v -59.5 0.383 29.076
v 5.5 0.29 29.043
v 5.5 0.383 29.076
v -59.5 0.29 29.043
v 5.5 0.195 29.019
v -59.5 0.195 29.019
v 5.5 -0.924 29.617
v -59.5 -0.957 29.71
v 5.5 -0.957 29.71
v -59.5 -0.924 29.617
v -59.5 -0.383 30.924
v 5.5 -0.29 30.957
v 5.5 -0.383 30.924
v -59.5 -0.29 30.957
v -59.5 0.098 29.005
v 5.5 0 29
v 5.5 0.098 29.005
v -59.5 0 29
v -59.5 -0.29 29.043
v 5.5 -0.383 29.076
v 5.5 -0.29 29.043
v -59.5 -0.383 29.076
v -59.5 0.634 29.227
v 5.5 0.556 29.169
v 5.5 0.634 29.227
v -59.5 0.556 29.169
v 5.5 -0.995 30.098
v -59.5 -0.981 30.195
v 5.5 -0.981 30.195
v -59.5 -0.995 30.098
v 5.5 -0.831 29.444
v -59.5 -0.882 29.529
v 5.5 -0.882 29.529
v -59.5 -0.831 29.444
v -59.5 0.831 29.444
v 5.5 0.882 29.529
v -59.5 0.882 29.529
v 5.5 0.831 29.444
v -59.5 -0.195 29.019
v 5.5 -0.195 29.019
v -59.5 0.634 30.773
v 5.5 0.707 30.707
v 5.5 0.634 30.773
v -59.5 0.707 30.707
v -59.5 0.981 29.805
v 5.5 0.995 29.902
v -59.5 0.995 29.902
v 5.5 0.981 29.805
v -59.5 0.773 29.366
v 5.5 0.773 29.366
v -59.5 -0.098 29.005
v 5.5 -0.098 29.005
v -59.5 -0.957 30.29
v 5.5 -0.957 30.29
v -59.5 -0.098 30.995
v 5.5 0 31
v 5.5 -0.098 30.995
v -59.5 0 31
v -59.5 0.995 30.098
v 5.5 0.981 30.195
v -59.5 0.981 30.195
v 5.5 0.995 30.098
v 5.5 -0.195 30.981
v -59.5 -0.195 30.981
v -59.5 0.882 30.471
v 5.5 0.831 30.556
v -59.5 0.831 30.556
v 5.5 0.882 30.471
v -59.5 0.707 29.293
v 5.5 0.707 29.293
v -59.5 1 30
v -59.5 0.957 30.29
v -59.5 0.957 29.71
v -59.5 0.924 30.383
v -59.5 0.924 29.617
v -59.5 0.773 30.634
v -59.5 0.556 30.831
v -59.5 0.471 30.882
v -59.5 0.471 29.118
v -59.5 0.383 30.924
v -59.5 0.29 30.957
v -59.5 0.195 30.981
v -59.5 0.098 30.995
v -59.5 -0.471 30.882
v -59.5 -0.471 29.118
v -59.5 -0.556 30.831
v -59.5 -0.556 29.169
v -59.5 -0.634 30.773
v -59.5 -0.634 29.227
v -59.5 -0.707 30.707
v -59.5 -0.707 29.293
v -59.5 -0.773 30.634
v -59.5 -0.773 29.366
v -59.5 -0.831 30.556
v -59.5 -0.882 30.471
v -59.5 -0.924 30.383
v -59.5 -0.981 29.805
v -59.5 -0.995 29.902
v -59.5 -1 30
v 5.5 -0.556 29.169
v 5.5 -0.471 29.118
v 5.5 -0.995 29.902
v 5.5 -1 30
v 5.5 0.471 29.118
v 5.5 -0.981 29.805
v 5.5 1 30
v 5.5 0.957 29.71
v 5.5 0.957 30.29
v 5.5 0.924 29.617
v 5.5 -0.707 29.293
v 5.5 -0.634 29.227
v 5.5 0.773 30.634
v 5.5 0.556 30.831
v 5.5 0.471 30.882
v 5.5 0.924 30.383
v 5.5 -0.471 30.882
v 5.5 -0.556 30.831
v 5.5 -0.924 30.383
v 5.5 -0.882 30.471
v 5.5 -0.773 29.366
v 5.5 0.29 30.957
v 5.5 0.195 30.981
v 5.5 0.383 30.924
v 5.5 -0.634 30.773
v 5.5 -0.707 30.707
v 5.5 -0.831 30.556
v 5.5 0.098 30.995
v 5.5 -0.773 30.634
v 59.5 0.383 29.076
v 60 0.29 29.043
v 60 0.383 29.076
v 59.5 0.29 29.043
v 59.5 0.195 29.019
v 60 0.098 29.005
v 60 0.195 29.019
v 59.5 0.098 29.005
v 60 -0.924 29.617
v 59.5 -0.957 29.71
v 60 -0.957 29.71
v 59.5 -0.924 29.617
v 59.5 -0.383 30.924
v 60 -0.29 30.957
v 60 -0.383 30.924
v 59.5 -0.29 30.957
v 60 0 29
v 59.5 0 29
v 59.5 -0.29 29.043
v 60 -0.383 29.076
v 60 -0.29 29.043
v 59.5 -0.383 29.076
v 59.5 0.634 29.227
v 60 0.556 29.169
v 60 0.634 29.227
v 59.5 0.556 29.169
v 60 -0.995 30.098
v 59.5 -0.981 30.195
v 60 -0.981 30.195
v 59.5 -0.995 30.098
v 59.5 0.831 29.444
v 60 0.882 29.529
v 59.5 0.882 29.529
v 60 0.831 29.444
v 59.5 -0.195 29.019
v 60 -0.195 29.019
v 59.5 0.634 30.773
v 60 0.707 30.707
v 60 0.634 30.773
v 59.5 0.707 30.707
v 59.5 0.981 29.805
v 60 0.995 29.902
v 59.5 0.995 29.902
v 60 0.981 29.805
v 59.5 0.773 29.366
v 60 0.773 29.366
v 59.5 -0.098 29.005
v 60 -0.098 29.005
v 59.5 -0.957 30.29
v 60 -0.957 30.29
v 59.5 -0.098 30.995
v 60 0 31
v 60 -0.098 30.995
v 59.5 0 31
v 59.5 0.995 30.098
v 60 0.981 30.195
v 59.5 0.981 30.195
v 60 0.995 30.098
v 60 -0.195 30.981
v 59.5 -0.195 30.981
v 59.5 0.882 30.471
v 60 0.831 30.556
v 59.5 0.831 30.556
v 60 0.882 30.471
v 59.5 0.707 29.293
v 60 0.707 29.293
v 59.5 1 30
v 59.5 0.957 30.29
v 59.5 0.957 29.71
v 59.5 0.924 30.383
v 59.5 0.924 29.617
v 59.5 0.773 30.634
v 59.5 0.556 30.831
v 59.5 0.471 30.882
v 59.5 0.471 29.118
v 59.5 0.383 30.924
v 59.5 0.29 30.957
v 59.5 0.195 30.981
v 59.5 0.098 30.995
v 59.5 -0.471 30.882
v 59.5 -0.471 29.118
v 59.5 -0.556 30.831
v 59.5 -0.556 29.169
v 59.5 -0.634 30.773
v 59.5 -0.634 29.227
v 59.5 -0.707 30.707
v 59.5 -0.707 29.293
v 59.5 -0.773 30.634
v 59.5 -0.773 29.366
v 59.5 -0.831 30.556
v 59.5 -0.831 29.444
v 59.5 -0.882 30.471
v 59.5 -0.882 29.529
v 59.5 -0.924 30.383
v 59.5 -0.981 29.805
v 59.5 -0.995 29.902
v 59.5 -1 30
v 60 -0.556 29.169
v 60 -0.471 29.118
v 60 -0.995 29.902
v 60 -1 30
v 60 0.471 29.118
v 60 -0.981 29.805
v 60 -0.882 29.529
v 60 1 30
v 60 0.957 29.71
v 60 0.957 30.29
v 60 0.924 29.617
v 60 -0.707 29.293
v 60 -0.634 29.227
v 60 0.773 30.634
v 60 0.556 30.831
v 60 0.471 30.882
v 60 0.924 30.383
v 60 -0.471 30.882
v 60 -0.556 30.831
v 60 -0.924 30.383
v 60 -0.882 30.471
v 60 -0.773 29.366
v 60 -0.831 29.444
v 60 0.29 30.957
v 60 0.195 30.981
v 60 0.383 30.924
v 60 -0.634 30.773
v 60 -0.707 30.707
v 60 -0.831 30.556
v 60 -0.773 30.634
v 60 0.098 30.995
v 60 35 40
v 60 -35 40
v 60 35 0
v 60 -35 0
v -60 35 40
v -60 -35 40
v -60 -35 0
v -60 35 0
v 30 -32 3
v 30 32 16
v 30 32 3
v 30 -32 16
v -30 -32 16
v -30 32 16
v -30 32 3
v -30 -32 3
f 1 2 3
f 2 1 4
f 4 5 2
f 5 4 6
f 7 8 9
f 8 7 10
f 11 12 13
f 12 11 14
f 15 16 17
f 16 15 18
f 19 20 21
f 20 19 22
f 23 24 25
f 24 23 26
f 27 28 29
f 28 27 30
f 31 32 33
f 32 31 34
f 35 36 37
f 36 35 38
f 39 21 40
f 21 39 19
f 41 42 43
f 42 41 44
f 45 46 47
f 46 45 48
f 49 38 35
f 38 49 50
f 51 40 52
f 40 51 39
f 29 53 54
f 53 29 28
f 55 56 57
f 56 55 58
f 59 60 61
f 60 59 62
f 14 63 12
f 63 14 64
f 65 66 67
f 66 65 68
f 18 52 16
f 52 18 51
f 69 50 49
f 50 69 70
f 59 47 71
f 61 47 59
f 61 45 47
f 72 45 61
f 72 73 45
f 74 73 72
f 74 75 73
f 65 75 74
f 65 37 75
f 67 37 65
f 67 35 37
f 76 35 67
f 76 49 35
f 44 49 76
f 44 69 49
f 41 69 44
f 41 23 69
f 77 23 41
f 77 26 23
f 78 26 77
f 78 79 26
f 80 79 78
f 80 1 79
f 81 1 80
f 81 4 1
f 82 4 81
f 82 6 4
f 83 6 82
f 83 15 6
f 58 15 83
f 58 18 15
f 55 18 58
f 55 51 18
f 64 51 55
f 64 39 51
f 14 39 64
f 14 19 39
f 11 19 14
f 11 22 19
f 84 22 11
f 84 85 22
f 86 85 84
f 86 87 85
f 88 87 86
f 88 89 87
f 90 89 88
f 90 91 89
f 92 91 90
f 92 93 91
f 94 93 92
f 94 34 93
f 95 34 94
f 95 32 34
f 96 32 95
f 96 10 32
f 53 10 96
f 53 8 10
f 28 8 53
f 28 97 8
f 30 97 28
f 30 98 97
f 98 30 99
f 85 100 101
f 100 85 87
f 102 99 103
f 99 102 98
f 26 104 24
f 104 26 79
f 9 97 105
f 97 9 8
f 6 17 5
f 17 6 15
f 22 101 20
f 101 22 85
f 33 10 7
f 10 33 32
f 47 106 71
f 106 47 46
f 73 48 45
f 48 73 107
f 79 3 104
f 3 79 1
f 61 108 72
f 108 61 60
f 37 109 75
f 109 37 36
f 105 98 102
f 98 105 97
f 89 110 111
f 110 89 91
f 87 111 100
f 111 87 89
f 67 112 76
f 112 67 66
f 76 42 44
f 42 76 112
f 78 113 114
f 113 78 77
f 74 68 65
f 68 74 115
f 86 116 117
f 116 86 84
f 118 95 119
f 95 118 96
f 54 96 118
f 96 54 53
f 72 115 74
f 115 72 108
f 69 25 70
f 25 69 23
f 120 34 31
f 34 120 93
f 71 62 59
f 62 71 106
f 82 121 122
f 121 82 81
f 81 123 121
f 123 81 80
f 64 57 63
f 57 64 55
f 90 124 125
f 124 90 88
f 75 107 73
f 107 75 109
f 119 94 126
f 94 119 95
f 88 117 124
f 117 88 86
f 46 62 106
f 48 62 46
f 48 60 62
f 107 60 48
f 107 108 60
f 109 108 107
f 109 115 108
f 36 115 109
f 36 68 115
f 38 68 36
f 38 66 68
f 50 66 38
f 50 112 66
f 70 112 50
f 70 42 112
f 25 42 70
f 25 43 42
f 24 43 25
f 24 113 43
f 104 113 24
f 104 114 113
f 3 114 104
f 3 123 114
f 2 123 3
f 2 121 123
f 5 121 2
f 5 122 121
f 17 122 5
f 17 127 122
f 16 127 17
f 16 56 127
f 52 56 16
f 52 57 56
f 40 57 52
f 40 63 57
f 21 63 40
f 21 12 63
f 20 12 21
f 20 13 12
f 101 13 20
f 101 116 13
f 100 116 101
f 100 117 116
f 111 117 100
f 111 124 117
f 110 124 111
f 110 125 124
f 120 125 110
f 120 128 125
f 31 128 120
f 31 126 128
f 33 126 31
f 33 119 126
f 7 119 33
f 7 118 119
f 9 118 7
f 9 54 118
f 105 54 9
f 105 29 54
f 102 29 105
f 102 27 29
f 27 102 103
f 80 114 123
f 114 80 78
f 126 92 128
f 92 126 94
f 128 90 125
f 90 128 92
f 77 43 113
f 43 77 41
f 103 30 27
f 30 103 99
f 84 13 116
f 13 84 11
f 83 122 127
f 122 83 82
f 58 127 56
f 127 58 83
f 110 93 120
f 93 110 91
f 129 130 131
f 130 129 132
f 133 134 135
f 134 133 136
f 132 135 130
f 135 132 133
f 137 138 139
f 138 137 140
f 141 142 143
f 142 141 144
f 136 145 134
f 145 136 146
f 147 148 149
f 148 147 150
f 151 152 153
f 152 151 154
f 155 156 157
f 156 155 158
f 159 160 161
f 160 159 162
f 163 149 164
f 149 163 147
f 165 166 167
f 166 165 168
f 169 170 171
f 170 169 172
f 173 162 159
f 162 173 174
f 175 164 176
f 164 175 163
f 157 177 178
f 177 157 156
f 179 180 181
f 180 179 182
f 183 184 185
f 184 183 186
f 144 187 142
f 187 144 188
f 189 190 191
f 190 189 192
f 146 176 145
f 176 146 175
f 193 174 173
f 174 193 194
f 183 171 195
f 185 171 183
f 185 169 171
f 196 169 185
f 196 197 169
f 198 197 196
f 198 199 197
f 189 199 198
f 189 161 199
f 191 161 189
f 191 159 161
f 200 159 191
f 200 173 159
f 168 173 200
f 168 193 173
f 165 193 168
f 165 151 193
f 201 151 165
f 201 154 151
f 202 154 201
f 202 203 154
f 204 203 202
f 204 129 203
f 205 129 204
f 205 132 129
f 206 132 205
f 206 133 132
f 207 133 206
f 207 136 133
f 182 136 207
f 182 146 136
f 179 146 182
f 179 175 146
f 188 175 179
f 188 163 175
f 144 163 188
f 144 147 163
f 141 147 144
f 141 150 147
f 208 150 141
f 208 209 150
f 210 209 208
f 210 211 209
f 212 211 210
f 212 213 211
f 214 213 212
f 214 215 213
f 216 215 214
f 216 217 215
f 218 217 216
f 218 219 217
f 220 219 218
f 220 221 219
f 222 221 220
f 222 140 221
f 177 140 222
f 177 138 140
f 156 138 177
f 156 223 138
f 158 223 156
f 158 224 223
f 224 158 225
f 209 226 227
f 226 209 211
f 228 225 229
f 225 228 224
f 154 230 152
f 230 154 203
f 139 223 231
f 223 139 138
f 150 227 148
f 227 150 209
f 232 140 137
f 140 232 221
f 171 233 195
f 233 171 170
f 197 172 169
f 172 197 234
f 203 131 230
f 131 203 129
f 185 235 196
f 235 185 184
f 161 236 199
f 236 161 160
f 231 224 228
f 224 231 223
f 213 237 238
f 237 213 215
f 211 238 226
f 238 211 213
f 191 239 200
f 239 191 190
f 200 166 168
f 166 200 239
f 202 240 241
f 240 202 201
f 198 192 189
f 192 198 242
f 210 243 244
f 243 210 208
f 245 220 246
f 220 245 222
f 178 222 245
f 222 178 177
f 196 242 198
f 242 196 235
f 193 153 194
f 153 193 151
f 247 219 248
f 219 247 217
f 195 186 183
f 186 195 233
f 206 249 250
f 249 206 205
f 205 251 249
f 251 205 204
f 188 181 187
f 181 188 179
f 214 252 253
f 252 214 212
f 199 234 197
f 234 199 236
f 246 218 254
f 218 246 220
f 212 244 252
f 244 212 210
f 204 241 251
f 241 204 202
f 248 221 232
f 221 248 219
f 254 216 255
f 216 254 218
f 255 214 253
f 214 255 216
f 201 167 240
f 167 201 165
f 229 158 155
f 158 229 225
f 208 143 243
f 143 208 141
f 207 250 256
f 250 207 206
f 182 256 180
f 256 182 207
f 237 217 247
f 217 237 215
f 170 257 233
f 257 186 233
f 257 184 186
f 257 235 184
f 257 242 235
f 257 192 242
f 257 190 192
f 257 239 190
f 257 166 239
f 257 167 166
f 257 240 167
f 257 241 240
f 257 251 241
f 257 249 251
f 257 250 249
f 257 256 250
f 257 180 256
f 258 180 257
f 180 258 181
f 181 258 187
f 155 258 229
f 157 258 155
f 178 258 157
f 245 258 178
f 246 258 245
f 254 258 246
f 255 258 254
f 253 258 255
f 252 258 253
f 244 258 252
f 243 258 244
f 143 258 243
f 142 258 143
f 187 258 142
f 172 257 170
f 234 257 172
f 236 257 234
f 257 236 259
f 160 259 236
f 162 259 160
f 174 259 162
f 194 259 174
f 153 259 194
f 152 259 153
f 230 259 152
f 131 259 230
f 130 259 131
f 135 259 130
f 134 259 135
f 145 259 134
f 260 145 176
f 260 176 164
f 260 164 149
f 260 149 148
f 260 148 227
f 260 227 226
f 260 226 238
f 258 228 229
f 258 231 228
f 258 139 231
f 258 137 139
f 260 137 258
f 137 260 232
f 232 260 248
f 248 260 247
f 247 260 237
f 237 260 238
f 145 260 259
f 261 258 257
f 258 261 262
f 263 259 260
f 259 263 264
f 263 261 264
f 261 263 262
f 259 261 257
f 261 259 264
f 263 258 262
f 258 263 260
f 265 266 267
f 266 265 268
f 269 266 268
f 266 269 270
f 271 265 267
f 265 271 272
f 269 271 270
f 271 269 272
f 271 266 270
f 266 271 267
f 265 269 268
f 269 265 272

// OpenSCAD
// Mini horizontal gel-electrophoresis buffer tank
// Print orientation: tank rests on XY plane, builds upward in +Z

$fn = 64;

// ---- Tank dimensions ----
tank_x_out = 120;   // outer length in X
tank_y_out = 70;    // outer width in Y
tank_z_out = 40;    // outer height in Z
wall       = 3;     // wall thickness
floor      = 3;     // floor thickness

// ---- Platform dimensions ----
plat_x     = 60;    // platform length in X (centred)
plat_y     = tank_y_out - 2 * wall; // platform spans full inner width
plat_top_z = 13;    // platform top height above tank floor

// ---- Cutout dimensions ----
hole_d     = 2;     // electrode wire hole diameter
hole_y     = 0;     // hole centre Y
hole_z     = 30;    // hole centre Z

// ---- Derived ----
inner_h = tank_z_out - floor; // height of buffer chambers
eps     = 0.5;              // cutter overshoot

difference() {
    // Tank body (solid outer block, open top)
    translate([-tank_x_out/2, -tank_y_out/2, 0])
        cube([tank_x_out, tank_y_out, tank_z_out]);

    // Gel tray platform, raised from floor
    translate([-plat_x/2, -plat_y/2, floor])
        cube([plat_x, plat_y, plat_top_z]);

    // Electrode wire holes through end walls
    for (sx = [-1, 1])
        translate([sx * (tank_x_out/2 - eps), hole_y, hole_z])
            rotate([0, 90, 0])
                cylinder(d = hole_d, h = plat_y + 2*eps);
}
